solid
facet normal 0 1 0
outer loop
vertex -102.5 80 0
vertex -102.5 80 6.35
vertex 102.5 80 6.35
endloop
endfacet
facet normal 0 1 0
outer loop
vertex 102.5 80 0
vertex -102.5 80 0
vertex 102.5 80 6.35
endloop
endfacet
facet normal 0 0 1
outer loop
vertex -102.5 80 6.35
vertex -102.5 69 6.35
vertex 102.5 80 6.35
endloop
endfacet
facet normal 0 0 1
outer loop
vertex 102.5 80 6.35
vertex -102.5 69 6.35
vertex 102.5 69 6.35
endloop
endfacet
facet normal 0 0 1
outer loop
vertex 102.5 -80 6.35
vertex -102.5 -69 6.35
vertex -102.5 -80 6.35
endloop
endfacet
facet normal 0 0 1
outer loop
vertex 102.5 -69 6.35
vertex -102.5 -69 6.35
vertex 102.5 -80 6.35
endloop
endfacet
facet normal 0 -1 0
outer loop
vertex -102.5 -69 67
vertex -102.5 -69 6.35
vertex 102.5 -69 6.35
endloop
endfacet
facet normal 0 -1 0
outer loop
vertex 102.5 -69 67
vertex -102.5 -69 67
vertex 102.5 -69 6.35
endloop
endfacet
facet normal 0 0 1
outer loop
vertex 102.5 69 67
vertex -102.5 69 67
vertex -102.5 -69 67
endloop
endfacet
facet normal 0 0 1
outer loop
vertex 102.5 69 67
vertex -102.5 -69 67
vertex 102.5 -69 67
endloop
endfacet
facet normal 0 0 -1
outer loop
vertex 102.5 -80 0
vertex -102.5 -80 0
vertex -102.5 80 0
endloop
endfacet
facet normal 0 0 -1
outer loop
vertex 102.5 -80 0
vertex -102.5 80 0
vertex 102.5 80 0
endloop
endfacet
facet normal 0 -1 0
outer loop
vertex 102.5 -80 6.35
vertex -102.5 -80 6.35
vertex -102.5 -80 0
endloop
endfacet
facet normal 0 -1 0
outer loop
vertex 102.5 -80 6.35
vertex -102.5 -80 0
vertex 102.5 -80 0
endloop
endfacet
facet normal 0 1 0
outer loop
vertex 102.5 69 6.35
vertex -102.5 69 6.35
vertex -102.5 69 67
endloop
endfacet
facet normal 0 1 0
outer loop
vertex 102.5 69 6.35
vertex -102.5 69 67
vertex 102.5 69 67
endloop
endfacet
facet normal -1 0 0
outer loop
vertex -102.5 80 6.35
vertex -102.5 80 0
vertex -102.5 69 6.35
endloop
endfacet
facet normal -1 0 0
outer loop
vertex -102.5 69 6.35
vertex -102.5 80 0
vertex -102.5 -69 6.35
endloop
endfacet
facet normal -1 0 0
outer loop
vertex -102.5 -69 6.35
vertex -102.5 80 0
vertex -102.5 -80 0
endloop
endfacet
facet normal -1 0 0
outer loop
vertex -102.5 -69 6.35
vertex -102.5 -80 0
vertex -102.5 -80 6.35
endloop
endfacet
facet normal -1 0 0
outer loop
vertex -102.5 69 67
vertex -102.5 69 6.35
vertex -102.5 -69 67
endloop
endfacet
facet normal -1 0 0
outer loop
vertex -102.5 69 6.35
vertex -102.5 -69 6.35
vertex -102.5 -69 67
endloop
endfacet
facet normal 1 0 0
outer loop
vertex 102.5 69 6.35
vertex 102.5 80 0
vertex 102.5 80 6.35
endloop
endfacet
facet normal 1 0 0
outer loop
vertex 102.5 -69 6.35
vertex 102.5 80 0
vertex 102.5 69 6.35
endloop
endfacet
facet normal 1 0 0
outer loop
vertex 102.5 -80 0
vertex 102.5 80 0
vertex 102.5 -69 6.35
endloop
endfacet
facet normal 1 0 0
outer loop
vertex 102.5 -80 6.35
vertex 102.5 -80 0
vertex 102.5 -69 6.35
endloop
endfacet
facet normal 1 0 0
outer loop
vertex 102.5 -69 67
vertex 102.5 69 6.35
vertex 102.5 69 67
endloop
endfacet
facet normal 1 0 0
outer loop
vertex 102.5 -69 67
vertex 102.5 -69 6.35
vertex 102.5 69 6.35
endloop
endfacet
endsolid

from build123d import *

# Parameters (mm, degrees)
F0_W     = 205
F0_H     = 138
F1_DEPTH = 67
F2_W     = 205
F2_H     = 6.35
F3_DEPTH = 11


# Not quite as in the source:
# - a pattern or mirror of a feature is missing from the dataset's text; its kind, count and spacing are read off the source's solid


with BuildPart() as f1:
    # F0 (on Top) → F1 (new body)
    with BuildSketch(Plane.XY):
        Rectangle(F0_W, F0_H)
    extrude(amount=F1_DEPTH)

    # F2 (on face) → F3 (join)
    with BuildSketch(Plane.XZ.offset(69)):
        with Locations((0, 3.175)):
            Rectangle(F2_W, F2_H)
    f3 = extrude(amount=F3_DEPTH)

    # F3_copies: F3 across plane
    add(f3.mirror(Plane.ZX))


solid = f1.part
